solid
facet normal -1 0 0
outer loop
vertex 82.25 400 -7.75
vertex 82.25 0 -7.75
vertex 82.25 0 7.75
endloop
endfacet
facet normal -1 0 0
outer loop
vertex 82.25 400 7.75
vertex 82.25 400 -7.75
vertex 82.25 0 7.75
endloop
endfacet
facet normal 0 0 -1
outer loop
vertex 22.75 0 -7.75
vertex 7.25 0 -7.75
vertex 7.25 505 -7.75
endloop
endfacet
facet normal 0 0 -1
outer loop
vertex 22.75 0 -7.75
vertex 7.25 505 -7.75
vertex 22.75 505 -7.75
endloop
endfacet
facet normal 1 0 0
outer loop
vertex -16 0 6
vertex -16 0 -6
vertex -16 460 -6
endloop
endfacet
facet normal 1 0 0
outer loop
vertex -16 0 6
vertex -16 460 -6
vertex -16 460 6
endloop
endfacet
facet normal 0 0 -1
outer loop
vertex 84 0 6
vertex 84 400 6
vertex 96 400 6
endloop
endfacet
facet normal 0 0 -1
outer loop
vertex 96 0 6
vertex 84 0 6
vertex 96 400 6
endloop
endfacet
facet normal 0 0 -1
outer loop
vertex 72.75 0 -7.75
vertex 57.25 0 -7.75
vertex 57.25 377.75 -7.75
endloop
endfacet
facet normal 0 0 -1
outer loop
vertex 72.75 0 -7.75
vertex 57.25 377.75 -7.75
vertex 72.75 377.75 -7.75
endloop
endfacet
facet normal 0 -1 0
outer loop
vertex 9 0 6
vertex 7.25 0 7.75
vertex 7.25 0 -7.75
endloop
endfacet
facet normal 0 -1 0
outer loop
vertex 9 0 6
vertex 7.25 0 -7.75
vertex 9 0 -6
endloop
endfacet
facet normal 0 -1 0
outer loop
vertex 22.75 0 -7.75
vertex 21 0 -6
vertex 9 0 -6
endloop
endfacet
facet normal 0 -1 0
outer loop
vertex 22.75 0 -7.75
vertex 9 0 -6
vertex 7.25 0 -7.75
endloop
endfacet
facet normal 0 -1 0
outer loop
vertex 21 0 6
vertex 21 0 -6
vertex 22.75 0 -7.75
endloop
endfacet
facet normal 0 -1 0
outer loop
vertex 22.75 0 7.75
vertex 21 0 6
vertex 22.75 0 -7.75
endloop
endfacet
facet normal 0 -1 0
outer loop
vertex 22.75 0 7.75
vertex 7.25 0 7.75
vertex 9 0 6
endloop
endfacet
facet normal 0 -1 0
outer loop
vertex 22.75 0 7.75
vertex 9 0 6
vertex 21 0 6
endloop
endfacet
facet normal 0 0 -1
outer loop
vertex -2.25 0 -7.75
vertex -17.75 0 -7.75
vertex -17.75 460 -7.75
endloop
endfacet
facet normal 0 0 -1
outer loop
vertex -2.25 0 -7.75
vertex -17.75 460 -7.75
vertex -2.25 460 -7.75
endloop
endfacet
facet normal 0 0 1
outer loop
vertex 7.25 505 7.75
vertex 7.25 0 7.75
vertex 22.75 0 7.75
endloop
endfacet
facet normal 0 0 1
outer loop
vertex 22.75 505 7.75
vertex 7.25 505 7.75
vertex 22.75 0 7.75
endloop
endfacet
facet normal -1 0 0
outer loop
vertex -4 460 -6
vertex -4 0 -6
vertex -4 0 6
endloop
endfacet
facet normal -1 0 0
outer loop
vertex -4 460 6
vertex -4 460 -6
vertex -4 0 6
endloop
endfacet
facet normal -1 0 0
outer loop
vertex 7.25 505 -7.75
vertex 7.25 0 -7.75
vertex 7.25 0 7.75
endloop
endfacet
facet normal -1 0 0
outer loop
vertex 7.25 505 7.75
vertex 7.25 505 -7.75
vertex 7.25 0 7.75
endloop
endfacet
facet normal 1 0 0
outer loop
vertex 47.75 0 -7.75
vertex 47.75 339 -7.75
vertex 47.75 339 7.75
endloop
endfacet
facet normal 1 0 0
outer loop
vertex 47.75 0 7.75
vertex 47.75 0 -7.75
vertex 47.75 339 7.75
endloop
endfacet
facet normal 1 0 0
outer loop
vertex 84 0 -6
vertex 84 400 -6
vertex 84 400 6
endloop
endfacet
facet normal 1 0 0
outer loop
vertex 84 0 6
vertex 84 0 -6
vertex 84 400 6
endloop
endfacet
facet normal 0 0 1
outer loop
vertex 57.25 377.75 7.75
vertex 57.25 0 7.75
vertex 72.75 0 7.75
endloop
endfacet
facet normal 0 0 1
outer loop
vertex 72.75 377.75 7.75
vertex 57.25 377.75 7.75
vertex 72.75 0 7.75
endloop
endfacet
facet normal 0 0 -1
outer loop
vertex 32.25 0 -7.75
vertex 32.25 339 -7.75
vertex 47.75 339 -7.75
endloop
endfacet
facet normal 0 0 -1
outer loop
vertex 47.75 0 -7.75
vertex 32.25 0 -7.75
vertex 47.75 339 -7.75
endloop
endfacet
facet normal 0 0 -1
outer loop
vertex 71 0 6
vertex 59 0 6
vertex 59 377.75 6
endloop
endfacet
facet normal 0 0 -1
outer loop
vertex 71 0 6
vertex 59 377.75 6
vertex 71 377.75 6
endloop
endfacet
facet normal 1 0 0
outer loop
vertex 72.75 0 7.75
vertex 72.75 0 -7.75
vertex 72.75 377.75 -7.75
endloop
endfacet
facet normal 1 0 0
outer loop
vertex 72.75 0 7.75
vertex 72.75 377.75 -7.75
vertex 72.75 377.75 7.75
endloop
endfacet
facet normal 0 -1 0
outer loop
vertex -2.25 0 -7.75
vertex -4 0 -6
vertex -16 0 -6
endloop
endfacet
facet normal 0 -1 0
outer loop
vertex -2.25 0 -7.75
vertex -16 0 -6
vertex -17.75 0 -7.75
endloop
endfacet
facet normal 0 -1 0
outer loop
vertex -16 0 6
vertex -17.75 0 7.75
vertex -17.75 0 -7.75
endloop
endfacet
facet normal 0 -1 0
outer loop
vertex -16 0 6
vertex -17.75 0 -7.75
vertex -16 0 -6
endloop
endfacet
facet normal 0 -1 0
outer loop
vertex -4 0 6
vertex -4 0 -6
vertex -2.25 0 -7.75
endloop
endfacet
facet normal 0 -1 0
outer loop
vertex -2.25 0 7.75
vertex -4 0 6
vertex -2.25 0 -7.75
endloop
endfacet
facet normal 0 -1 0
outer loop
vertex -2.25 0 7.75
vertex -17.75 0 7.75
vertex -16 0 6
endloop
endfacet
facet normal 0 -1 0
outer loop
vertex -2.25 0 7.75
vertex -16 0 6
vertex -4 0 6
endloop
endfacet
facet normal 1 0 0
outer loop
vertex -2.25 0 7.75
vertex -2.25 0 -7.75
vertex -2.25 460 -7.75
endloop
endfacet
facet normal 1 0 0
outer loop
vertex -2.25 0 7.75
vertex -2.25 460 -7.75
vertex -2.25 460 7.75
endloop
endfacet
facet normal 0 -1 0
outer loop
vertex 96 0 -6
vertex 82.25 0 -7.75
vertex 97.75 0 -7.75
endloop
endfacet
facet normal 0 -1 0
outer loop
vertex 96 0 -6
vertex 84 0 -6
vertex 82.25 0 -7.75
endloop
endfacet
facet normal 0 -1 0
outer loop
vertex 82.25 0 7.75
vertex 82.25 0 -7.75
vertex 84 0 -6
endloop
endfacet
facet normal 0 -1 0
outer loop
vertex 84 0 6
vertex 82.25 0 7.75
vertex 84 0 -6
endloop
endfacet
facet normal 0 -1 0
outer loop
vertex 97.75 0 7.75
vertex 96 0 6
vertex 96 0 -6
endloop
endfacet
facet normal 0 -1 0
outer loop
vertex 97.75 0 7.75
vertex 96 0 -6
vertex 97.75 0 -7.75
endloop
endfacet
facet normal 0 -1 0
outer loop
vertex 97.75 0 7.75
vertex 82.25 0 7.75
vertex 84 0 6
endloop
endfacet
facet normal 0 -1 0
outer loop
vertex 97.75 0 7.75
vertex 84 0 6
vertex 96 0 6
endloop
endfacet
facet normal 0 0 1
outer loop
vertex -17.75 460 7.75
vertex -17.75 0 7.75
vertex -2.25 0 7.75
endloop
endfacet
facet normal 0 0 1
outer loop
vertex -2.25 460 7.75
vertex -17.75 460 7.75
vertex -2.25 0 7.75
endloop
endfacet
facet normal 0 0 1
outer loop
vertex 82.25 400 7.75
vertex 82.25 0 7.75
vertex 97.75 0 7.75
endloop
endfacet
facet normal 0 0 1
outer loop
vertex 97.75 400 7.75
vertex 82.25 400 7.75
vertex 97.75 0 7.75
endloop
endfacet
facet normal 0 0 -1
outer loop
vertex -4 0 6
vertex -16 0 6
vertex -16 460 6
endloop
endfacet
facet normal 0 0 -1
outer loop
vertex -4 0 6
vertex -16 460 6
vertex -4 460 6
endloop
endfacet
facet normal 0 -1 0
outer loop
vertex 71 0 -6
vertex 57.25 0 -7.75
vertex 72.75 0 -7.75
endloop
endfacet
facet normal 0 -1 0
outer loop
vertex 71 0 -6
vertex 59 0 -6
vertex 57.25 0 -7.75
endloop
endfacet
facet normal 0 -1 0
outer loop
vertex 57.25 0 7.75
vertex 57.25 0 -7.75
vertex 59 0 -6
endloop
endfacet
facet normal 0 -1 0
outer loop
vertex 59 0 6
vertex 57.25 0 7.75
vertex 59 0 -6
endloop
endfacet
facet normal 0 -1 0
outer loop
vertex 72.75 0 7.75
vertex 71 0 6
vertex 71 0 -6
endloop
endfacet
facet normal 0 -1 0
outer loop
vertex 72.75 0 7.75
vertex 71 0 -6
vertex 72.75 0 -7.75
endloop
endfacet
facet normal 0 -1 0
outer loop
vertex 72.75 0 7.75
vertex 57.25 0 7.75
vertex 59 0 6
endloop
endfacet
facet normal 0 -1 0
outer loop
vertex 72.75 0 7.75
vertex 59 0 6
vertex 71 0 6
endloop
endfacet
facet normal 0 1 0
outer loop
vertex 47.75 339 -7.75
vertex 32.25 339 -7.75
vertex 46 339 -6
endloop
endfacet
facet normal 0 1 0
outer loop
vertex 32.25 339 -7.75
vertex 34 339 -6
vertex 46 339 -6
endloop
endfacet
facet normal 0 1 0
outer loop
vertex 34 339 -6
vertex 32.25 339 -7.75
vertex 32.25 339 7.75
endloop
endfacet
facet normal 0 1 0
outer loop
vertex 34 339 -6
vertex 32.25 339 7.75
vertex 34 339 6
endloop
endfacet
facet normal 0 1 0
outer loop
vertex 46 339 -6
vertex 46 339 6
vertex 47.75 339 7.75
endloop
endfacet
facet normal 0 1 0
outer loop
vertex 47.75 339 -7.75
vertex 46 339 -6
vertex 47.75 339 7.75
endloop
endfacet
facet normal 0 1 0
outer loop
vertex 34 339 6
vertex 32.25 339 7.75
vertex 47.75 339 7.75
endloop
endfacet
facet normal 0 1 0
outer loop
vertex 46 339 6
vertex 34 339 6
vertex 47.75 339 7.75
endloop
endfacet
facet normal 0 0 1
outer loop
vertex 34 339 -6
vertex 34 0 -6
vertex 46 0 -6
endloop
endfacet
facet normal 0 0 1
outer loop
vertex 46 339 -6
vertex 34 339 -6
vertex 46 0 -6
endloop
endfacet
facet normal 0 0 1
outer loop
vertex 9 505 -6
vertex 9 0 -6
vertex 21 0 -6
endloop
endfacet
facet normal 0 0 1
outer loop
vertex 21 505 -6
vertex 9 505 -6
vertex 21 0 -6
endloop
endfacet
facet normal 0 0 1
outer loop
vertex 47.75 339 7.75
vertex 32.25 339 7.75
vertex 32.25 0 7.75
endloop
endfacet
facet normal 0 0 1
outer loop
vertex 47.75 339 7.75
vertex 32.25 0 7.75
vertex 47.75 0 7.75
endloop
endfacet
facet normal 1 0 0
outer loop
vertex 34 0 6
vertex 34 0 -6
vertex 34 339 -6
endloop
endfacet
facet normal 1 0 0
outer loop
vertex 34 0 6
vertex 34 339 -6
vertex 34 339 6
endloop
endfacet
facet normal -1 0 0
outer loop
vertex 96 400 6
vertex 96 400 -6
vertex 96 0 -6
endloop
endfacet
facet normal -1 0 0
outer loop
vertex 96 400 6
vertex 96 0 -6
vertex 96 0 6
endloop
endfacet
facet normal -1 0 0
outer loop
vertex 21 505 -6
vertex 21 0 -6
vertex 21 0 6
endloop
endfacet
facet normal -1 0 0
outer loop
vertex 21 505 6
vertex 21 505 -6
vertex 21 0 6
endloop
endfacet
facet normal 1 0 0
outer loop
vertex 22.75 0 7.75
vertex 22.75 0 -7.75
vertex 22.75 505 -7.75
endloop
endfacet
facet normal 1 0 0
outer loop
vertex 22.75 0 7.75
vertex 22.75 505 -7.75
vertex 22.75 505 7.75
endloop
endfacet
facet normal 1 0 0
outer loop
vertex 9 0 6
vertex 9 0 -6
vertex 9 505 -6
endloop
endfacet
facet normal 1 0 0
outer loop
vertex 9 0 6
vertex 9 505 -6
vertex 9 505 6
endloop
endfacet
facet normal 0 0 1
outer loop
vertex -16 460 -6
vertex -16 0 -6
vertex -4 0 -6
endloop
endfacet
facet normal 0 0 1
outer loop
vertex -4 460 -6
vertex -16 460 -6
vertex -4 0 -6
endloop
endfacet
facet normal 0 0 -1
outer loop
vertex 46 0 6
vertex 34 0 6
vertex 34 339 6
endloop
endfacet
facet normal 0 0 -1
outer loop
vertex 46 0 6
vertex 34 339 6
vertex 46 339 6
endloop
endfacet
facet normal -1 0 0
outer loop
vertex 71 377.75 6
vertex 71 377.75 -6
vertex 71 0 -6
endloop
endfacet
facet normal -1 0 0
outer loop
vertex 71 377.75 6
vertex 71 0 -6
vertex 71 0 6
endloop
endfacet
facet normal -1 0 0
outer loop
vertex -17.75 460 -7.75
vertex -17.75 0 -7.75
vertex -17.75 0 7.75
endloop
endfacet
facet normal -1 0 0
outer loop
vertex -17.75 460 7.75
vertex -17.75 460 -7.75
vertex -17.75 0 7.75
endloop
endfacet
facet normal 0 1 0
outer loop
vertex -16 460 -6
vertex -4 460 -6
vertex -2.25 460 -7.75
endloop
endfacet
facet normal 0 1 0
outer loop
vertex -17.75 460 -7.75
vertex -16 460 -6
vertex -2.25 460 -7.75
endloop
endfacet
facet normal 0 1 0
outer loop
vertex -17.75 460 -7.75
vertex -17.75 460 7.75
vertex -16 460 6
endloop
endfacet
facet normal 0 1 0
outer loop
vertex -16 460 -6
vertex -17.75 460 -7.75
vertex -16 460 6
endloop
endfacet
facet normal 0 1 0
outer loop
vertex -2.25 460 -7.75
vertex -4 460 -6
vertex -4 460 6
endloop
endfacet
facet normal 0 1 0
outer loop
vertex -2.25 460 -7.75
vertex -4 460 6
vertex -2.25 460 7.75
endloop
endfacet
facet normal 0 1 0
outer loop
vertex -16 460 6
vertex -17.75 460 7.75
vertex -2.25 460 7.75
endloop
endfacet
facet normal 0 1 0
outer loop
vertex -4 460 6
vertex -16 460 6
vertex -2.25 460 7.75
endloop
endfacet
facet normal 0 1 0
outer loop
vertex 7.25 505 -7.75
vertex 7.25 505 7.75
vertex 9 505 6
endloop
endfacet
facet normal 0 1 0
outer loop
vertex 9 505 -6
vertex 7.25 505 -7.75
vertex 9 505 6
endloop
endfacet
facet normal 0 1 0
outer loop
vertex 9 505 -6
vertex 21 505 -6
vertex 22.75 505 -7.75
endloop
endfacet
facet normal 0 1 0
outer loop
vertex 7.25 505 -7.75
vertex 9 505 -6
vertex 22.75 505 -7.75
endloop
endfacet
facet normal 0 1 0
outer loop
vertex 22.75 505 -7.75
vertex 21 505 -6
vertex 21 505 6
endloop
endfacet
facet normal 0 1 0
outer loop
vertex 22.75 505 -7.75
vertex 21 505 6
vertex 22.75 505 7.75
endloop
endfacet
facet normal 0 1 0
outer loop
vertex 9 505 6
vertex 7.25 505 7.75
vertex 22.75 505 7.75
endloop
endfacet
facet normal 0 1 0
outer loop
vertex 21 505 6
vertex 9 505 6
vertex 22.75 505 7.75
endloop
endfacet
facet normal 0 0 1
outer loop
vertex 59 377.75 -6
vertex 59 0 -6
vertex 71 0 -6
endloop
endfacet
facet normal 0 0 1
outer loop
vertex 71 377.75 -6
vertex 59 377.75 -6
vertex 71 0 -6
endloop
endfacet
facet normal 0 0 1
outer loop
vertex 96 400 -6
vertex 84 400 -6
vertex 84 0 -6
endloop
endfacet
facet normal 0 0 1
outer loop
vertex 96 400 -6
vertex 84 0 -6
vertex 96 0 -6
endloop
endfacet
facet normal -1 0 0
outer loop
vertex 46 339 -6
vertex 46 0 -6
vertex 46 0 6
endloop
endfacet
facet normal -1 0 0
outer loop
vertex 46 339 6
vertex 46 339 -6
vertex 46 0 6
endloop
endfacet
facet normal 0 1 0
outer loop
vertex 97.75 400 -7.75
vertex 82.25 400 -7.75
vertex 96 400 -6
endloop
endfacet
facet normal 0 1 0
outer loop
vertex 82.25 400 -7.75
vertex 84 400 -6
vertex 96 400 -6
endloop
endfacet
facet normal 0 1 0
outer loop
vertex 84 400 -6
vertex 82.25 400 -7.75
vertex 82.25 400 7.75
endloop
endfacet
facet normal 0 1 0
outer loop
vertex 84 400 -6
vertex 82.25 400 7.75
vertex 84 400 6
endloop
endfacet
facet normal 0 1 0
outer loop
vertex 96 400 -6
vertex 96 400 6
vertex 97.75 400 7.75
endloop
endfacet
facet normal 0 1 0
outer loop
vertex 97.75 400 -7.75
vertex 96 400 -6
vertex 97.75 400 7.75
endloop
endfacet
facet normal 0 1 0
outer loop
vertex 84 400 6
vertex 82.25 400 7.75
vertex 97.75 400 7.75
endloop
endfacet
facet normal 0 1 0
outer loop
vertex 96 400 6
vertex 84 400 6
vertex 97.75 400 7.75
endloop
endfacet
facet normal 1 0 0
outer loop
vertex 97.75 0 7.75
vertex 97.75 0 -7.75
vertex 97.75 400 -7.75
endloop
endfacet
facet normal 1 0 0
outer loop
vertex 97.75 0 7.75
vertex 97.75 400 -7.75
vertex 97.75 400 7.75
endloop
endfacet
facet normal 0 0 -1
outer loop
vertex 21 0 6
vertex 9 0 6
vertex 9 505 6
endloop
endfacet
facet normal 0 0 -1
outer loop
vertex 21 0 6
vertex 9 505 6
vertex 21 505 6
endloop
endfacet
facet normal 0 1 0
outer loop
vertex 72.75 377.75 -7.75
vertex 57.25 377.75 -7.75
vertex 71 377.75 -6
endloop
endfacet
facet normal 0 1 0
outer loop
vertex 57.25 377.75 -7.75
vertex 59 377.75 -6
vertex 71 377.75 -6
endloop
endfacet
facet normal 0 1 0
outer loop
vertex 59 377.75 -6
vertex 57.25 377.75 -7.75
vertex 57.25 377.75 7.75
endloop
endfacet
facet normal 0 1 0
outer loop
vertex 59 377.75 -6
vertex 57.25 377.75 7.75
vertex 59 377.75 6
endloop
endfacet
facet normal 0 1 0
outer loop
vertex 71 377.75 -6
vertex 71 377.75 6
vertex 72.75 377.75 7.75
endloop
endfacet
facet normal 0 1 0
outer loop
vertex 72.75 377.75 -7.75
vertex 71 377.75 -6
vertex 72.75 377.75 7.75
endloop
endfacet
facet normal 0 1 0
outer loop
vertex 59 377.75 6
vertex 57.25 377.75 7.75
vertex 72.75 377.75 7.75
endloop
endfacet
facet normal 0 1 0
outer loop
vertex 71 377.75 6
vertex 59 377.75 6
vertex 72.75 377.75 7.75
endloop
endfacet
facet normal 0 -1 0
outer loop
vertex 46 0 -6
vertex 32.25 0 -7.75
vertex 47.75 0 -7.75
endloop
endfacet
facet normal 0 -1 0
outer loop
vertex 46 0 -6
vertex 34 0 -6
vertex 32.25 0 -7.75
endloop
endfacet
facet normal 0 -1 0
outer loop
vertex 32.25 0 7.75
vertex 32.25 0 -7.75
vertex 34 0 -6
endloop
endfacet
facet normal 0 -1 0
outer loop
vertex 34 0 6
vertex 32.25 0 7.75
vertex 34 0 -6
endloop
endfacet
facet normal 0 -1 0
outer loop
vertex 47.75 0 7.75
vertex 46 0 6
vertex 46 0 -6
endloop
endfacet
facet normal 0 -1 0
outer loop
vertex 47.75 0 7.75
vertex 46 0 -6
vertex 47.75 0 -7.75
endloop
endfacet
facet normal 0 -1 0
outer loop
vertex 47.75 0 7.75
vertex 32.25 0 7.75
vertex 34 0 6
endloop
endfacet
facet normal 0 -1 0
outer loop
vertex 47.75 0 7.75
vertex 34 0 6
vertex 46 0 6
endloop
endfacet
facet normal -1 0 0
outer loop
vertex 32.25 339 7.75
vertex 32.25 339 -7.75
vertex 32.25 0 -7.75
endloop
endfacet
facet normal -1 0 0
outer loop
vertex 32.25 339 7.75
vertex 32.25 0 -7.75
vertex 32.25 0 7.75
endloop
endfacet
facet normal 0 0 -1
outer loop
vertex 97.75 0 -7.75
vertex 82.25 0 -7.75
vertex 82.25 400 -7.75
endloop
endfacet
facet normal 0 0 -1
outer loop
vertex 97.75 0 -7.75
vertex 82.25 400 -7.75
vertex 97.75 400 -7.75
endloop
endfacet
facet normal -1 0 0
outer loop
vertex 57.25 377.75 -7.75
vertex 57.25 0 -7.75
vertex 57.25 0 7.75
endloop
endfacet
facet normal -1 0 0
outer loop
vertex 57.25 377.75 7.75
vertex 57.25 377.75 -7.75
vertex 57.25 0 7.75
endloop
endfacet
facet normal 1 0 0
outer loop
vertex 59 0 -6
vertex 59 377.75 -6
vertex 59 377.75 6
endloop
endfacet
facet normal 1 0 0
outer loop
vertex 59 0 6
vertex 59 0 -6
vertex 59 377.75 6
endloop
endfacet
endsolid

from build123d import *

# Parameters (mm, degrees)
F0_W     = 15.5
F0_H     = 15.5
F0_W_2   = 12
F0_H_2   = 12
F1_DEPTH = 460
F2_DEPTH = 505
F3_DEPTH = 339
F4_DEPTH = 377.75
F5_DEPTH = 400


with BuildPart() as f1:
    # F0 (on Front) → F1 (new body)
    with BuildSketch(Plane.XZ):
        with Locations((-10, 0)):
            Rectangle(F0_W, F0_H)
        with Locations((-10, 0)):
            Rectangle(F0_W_2, F0_H_2, mode=Mode.SUBTRACT)
    extrude(amount=-F1_DEPTH)


with BuildPart() as f2:
    # F0 (on Front) → F2 (new body)
    with BuildSketch(Plane.XZ):
        with Locations((15, 0)):
            Rectangle(F0_W, F0_H)
        with Locations((15, 0)):
            Rectangle(F0_W_2, F0_H_2, mode=Mode.SUBTRACT)
    extrude(amount=-F2_DEPTH)


with BuildPart() as f3:
    # F0 (on Front) → F3 (new body)
    with BuildSketch(Plane.XZ):
        with Locations((40, 0)):
            Rectangle(F0_W, F0_H)
        with Locations((40, 0)):
            Rectangle(F0_W_2, F0_H_2, mode=Mode.SUBTRACT)
    extrude(amount=-F3_DEPTH)


with BuildPart() as f4:
    # F0 (on Front) → F4 (new body)
    with BuildSketch(Plane.XZ):
        with Locations((65, 0)):
            Rectangle(F0_W, F0_H)
        with Locations((65, 0)):
            Rectangle(F0_W_2, F0_H_2, mode=Mode.SUBTRACT)
    extrude(amount=-F4_DEPTH)


with BuildPart() as f5:
    # F0 (on Front) → F5 (new body)
    with BuildSketch(Plane.XZ):
        with Locations((90, 0)):
            Rectangle(F0_W, F0_H)
        with Locations((90, 0)):
            Rectangle(F0_W_2, F0_H_2, mode=Mode.SUBTRACT)
    extrude(amount=-F5_DEPTH)


solid = Compound([f1.part, f2.part, f3.part, f4.part, f5.part])
